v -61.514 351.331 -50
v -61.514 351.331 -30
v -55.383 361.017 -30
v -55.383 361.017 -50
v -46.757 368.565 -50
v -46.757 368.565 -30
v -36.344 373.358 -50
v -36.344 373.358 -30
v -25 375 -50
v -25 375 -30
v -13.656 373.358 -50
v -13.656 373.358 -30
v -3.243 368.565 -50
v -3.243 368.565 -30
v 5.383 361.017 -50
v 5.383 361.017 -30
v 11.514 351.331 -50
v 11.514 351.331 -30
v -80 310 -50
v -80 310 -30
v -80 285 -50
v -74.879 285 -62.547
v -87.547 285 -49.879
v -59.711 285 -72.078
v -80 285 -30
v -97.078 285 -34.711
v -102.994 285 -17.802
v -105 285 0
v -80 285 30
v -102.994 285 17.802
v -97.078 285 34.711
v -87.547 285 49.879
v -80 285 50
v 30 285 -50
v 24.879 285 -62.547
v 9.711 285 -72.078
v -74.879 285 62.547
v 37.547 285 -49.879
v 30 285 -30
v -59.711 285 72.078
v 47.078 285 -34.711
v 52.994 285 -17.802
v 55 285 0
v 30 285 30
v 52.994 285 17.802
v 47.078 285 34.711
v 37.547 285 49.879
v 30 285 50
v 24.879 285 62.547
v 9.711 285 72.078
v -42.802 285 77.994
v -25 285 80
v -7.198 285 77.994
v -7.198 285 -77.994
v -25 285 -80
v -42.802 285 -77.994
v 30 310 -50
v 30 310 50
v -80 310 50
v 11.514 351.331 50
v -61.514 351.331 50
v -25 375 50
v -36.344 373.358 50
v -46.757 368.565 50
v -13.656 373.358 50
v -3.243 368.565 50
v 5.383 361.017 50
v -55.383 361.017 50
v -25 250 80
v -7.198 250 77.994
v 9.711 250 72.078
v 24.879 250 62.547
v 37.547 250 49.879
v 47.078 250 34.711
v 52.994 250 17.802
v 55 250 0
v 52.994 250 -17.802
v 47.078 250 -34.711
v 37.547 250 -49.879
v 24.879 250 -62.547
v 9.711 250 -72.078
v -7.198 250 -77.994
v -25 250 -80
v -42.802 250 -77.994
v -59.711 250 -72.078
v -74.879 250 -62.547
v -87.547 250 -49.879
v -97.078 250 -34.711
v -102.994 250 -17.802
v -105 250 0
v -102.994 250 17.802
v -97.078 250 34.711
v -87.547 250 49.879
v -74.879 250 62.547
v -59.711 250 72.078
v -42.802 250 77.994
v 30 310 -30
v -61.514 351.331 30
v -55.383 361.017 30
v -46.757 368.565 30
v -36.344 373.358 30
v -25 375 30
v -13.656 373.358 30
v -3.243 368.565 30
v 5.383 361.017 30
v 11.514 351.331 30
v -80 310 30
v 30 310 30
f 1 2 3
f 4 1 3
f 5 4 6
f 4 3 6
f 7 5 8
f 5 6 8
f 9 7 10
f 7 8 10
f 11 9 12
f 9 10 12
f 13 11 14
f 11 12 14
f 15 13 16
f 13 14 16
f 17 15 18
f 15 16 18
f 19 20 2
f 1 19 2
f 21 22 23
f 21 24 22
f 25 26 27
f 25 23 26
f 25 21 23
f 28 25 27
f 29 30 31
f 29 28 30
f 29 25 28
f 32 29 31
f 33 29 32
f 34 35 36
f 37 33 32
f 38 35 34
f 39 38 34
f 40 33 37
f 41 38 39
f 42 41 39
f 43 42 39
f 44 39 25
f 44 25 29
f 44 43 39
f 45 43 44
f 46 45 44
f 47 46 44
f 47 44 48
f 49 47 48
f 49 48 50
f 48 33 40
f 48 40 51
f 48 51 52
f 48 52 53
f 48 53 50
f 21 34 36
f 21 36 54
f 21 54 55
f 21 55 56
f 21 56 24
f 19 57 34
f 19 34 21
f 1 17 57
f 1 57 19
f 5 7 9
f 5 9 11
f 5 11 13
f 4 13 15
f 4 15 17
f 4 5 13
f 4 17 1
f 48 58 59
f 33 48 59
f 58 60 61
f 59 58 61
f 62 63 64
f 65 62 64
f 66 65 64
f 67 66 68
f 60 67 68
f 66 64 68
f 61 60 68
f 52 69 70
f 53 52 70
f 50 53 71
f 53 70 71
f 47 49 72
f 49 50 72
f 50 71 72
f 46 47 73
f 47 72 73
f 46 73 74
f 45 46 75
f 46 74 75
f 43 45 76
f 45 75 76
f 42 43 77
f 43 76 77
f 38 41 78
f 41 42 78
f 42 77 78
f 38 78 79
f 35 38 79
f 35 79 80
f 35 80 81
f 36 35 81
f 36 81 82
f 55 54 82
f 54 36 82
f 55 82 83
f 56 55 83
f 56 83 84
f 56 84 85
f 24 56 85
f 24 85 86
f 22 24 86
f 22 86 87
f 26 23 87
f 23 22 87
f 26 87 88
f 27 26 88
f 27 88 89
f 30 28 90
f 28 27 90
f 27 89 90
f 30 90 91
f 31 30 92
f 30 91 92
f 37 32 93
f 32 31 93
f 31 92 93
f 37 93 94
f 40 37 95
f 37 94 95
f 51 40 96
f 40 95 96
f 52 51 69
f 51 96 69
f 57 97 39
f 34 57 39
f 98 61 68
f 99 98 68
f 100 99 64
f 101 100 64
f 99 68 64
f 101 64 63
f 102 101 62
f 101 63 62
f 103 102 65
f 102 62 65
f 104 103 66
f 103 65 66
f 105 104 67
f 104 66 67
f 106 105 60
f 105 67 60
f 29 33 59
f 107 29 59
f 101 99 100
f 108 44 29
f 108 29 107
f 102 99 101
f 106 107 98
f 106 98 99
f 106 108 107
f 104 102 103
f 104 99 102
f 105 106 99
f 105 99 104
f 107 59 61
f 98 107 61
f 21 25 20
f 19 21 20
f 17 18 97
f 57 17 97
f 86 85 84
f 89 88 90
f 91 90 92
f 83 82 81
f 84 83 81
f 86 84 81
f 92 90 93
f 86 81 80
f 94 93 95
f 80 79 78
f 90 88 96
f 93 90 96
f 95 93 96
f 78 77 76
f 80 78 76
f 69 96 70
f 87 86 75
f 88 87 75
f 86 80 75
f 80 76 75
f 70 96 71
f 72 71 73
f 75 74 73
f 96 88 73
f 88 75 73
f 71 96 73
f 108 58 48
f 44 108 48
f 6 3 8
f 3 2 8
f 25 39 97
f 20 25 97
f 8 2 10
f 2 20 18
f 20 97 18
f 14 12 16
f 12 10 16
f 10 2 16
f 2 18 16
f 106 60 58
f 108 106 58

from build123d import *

# Parameters (mm, degrees)
CROQUIS1_W              = 15
CROQUIS1_H              = 50
CROQUIS1_W_2            = 50
CROQUIS1_H_2            = 115
SALIENTE_EXTRUIR1_DEPTH = 250
CROQUIS2_R              = 80
SALIENTE_EXTRUIR2_DEPTH = 35
SALIENTE_EXTRUIR3_DEPTH = 50
CROQUIS4_W              = 60
CROQUIS4_H              = 90
CORTAR_EXTRUIR1_DEPTH   = 407.509532484
CROQUIS5_R              = 80
CORTAR_EXTRUIR2_DEPTH   = 283.710098865


with BuildPart() as part:
    # Croquis1 → Saliente-Extruir1 (new body)
    with BuildSketch(Plane(origin=(0, 0, 0), x_dir=(1, 0, 0), z_dir=(0, 1, 0))):
        with Locations((-32.5, 0)):
            Rectangle(CROQUIS1_W, CROQUIS1_H)
        Rectangle(CROQUIS1_W_2, CROQUIS1_H_2)
    extrude(amount=SALIENTE_EXTRUIR1_DEPTH)

    # Croquis2 → Saliente-Extruir2 (add)
    with BuildSketch(Plane(origin=(0, 250, 0), x_dir=(1, 0, 0), z_dir=(0, 1, 0))):
        with Locations(Location((-25, 0, 0), (0, 0, 270))):
            Circle(CROQUIS2_R)
    extrude(amount=SALIENTE_EXTRUIR2_DEPTH)

    # Croquis3 → Saliente-Extruir3 (add, symmetric)
    with BuildSketch(Plane.XY):
        with BuildLine():
            Line((11.514226217, 351.331297677), (30, 310))
            Line((30, 310), (30, 285))
            Line((30, 285), (-80, 285))
            Line((-80, 285), (-80, 310))
            Line((-80, 310), (-61.514226217, 351.331297677))
            ThreePointArc((-61.514226217, 351.331297677), (-25, 375), (11.514226217, 351.331297677))
        make_face()
    extrude(amount=SALIENTE_EXTRUIR3_DEPTH, both=True)

    # Croquis4 → Cortar-Extruir1 (cut, through all)
    with BuildSketch(Plane(origin=(30, 0, 0), x_dir=(0, 0, -1), z_dir=(1, 0, 0))):
        with Locations((0, 330)):
            Rectangle(CROQUIS4_W, CROQUIS4_H)
    extrude(amount=-CORTAR_EXTRUIR1_DEPTH, mode=Mode.SUBTRACT)

    # Croquis5 → Cortar-Extruir2 (cut, through all)
    with BuildSketch(Plane.XZ.offset(-250)):
        with Locations(Location((-25, 0, 0), (0, 0, 90))):
            Circle(CROQUIS5_R)
    extrude(amount=CORTAR_EXTRUIR2_DEPTH, mode=Mode.SUBTRACT)


solid = part.part
